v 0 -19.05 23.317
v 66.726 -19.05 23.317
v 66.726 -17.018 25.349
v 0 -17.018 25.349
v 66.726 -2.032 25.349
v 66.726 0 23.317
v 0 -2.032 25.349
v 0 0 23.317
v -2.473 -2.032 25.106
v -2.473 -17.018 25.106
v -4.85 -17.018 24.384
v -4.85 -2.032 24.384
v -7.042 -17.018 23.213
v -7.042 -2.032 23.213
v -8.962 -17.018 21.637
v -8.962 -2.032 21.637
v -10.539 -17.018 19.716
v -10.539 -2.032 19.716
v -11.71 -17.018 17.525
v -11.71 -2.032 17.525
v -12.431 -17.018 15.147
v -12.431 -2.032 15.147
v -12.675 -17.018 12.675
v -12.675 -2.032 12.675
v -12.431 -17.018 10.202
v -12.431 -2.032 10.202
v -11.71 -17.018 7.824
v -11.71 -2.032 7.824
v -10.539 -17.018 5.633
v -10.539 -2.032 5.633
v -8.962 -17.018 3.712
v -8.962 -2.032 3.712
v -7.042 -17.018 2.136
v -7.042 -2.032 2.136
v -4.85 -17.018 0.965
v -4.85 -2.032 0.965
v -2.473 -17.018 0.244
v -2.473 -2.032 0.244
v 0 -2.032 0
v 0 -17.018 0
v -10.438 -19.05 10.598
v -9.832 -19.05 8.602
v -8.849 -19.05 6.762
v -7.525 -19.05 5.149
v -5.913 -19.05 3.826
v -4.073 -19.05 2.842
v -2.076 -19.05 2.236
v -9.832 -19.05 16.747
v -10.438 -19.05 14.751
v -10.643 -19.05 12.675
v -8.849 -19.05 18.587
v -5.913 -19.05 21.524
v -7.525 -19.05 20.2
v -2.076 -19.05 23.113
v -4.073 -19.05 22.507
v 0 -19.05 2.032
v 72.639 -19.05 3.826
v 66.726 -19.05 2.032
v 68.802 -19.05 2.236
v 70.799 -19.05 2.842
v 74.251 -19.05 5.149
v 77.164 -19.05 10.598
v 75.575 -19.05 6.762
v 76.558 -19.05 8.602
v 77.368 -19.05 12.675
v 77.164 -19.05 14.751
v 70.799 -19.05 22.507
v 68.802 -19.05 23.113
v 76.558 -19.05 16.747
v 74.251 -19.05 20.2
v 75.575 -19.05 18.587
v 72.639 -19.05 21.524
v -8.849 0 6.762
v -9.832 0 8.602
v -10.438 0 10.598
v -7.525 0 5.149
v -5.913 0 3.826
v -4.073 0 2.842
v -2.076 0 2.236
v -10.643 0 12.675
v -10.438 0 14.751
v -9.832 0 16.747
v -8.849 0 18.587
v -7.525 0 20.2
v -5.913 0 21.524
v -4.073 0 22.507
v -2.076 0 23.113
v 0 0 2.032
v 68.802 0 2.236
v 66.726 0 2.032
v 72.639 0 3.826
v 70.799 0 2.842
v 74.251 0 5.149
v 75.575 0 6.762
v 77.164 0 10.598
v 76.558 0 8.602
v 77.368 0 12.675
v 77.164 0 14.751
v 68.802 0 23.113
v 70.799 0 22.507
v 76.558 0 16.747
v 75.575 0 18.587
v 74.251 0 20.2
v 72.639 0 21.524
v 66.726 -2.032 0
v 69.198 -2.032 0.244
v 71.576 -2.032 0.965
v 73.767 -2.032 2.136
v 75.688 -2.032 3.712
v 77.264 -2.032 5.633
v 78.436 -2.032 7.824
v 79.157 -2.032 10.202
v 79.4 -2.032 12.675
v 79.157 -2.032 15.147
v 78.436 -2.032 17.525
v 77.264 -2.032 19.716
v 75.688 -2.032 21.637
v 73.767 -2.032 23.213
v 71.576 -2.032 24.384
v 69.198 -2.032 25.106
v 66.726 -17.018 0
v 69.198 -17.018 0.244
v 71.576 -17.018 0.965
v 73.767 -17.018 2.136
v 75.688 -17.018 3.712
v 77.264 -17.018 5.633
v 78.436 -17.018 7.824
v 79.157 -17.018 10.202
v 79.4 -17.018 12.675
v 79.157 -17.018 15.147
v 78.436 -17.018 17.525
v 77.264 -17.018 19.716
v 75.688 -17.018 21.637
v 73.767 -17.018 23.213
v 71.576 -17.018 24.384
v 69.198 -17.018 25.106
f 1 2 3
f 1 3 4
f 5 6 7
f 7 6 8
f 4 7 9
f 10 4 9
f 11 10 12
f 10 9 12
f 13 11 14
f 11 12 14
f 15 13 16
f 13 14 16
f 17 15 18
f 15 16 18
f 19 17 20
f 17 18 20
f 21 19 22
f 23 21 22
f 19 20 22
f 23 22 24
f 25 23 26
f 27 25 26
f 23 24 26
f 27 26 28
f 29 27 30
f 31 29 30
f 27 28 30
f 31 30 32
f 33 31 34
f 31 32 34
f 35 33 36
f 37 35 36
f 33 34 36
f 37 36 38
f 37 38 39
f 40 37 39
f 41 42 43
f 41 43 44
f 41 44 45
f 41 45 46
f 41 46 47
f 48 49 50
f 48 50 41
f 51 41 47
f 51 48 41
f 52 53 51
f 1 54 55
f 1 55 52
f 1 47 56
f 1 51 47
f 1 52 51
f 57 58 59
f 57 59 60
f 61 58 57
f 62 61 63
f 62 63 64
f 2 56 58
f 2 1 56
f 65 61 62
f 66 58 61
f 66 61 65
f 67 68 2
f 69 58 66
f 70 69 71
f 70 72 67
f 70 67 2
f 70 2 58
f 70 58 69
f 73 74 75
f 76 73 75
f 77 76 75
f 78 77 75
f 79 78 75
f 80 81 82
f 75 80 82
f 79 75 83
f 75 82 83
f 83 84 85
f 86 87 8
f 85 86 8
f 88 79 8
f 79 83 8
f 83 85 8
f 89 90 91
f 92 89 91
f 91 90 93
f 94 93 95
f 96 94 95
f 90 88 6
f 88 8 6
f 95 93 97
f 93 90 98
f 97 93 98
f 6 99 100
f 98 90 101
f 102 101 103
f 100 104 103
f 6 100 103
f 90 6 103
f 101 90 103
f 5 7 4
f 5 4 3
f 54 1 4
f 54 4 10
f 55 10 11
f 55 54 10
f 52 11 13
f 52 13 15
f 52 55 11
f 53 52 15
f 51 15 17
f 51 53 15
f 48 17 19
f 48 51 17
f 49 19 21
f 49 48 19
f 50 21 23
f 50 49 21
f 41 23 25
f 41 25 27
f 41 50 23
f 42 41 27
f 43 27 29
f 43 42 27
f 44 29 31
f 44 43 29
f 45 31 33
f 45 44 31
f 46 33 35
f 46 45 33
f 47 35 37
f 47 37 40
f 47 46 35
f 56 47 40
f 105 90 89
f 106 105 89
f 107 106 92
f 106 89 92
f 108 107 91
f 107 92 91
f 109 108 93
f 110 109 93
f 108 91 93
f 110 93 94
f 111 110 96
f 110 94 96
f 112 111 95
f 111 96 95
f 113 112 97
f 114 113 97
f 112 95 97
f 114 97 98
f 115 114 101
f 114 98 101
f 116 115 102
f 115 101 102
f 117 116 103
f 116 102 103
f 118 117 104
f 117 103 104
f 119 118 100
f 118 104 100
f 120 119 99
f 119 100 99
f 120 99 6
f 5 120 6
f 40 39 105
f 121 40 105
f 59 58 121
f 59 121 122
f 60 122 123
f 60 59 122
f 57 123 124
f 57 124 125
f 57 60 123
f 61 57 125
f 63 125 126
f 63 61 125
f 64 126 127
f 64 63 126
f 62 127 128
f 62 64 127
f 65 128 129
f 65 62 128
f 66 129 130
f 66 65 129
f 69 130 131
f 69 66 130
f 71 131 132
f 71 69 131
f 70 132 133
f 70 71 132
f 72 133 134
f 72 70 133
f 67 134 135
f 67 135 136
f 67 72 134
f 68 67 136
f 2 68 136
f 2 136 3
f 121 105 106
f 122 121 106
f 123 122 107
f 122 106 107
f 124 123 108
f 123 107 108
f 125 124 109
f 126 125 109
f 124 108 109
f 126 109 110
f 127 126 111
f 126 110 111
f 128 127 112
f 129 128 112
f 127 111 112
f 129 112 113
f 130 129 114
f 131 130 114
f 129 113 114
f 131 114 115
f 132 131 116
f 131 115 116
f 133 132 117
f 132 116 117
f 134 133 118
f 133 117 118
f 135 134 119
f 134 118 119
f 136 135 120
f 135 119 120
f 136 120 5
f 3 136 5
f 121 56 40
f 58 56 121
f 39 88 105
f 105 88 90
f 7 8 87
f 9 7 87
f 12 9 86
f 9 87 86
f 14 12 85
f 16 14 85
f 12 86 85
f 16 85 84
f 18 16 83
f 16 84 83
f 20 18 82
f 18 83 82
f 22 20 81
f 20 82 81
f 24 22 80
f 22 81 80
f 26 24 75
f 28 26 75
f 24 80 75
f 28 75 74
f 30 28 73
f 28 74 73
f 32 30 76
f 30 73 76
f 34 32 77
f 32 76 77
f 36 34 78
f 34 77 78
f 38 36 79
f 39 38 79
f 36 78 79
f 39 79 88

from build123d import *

# Parameters (mm, degrees)
F0_W     = 66.7258
F0_H     = 12.6746
F1_DEPTH = 19.05
F2_SIZE  = 2.032
F3_SIZE  = 2.032


with BuildPart() as f1:
    # F0 (on Front) → F1 (new body)
    with BuildSketch(Plane.XZ):
        with BuildLine():
            ThreePointArc((0, 25.3492), (-12.6746, 12.6746), (0, 0))
            Line((0, 0), (0, 12.6746))
            Line((0, 12.6746), (0, 25.3492))
        make_face()
        with Locations((33.3629, 19.0119)):
            Rectangle(F0_W, F0_H)
        with Locations((33.3629, 6.3373)):
            Rectangle(F0_W, F0_H)
        with BuildLine():
            Line((66.7258, 12.6746), (66.7258, 0))
            ThreePointArc((66.7258, 0), (79.4004, 12.6746), (66.7258, 25.3492))
            Line((66.7258, 25.3492), (66.7258, 12.6746))
        make_face()
    extrude(amount=F1_DEPTH)

    # F2
    f2_edges = [f1.edges().sort_by_distance(p)[0] for p in [
        (-12.6746, 0, 12.6746),
        (33.3629, 0, 0),
        (79.4004, 0, 12.6746),
        (33.3629, 0, 25.3492),
    ]]
    chamfer(f2_edges, length=F2_SIZE)

    # F3
    f3_edges = [f1.edges().sort_by_distance(p)[0] for p in [
        (-12.6746, -19.05, 12.6746),
        (33.3629, -19.05, 0),
        (79.4004, -19.05, 12.6746),
        (33.3629, -19.05, 25.3492),
    ]]
    chamfer(f3_edges, length=F3_SIZE)


solid = f1.part
